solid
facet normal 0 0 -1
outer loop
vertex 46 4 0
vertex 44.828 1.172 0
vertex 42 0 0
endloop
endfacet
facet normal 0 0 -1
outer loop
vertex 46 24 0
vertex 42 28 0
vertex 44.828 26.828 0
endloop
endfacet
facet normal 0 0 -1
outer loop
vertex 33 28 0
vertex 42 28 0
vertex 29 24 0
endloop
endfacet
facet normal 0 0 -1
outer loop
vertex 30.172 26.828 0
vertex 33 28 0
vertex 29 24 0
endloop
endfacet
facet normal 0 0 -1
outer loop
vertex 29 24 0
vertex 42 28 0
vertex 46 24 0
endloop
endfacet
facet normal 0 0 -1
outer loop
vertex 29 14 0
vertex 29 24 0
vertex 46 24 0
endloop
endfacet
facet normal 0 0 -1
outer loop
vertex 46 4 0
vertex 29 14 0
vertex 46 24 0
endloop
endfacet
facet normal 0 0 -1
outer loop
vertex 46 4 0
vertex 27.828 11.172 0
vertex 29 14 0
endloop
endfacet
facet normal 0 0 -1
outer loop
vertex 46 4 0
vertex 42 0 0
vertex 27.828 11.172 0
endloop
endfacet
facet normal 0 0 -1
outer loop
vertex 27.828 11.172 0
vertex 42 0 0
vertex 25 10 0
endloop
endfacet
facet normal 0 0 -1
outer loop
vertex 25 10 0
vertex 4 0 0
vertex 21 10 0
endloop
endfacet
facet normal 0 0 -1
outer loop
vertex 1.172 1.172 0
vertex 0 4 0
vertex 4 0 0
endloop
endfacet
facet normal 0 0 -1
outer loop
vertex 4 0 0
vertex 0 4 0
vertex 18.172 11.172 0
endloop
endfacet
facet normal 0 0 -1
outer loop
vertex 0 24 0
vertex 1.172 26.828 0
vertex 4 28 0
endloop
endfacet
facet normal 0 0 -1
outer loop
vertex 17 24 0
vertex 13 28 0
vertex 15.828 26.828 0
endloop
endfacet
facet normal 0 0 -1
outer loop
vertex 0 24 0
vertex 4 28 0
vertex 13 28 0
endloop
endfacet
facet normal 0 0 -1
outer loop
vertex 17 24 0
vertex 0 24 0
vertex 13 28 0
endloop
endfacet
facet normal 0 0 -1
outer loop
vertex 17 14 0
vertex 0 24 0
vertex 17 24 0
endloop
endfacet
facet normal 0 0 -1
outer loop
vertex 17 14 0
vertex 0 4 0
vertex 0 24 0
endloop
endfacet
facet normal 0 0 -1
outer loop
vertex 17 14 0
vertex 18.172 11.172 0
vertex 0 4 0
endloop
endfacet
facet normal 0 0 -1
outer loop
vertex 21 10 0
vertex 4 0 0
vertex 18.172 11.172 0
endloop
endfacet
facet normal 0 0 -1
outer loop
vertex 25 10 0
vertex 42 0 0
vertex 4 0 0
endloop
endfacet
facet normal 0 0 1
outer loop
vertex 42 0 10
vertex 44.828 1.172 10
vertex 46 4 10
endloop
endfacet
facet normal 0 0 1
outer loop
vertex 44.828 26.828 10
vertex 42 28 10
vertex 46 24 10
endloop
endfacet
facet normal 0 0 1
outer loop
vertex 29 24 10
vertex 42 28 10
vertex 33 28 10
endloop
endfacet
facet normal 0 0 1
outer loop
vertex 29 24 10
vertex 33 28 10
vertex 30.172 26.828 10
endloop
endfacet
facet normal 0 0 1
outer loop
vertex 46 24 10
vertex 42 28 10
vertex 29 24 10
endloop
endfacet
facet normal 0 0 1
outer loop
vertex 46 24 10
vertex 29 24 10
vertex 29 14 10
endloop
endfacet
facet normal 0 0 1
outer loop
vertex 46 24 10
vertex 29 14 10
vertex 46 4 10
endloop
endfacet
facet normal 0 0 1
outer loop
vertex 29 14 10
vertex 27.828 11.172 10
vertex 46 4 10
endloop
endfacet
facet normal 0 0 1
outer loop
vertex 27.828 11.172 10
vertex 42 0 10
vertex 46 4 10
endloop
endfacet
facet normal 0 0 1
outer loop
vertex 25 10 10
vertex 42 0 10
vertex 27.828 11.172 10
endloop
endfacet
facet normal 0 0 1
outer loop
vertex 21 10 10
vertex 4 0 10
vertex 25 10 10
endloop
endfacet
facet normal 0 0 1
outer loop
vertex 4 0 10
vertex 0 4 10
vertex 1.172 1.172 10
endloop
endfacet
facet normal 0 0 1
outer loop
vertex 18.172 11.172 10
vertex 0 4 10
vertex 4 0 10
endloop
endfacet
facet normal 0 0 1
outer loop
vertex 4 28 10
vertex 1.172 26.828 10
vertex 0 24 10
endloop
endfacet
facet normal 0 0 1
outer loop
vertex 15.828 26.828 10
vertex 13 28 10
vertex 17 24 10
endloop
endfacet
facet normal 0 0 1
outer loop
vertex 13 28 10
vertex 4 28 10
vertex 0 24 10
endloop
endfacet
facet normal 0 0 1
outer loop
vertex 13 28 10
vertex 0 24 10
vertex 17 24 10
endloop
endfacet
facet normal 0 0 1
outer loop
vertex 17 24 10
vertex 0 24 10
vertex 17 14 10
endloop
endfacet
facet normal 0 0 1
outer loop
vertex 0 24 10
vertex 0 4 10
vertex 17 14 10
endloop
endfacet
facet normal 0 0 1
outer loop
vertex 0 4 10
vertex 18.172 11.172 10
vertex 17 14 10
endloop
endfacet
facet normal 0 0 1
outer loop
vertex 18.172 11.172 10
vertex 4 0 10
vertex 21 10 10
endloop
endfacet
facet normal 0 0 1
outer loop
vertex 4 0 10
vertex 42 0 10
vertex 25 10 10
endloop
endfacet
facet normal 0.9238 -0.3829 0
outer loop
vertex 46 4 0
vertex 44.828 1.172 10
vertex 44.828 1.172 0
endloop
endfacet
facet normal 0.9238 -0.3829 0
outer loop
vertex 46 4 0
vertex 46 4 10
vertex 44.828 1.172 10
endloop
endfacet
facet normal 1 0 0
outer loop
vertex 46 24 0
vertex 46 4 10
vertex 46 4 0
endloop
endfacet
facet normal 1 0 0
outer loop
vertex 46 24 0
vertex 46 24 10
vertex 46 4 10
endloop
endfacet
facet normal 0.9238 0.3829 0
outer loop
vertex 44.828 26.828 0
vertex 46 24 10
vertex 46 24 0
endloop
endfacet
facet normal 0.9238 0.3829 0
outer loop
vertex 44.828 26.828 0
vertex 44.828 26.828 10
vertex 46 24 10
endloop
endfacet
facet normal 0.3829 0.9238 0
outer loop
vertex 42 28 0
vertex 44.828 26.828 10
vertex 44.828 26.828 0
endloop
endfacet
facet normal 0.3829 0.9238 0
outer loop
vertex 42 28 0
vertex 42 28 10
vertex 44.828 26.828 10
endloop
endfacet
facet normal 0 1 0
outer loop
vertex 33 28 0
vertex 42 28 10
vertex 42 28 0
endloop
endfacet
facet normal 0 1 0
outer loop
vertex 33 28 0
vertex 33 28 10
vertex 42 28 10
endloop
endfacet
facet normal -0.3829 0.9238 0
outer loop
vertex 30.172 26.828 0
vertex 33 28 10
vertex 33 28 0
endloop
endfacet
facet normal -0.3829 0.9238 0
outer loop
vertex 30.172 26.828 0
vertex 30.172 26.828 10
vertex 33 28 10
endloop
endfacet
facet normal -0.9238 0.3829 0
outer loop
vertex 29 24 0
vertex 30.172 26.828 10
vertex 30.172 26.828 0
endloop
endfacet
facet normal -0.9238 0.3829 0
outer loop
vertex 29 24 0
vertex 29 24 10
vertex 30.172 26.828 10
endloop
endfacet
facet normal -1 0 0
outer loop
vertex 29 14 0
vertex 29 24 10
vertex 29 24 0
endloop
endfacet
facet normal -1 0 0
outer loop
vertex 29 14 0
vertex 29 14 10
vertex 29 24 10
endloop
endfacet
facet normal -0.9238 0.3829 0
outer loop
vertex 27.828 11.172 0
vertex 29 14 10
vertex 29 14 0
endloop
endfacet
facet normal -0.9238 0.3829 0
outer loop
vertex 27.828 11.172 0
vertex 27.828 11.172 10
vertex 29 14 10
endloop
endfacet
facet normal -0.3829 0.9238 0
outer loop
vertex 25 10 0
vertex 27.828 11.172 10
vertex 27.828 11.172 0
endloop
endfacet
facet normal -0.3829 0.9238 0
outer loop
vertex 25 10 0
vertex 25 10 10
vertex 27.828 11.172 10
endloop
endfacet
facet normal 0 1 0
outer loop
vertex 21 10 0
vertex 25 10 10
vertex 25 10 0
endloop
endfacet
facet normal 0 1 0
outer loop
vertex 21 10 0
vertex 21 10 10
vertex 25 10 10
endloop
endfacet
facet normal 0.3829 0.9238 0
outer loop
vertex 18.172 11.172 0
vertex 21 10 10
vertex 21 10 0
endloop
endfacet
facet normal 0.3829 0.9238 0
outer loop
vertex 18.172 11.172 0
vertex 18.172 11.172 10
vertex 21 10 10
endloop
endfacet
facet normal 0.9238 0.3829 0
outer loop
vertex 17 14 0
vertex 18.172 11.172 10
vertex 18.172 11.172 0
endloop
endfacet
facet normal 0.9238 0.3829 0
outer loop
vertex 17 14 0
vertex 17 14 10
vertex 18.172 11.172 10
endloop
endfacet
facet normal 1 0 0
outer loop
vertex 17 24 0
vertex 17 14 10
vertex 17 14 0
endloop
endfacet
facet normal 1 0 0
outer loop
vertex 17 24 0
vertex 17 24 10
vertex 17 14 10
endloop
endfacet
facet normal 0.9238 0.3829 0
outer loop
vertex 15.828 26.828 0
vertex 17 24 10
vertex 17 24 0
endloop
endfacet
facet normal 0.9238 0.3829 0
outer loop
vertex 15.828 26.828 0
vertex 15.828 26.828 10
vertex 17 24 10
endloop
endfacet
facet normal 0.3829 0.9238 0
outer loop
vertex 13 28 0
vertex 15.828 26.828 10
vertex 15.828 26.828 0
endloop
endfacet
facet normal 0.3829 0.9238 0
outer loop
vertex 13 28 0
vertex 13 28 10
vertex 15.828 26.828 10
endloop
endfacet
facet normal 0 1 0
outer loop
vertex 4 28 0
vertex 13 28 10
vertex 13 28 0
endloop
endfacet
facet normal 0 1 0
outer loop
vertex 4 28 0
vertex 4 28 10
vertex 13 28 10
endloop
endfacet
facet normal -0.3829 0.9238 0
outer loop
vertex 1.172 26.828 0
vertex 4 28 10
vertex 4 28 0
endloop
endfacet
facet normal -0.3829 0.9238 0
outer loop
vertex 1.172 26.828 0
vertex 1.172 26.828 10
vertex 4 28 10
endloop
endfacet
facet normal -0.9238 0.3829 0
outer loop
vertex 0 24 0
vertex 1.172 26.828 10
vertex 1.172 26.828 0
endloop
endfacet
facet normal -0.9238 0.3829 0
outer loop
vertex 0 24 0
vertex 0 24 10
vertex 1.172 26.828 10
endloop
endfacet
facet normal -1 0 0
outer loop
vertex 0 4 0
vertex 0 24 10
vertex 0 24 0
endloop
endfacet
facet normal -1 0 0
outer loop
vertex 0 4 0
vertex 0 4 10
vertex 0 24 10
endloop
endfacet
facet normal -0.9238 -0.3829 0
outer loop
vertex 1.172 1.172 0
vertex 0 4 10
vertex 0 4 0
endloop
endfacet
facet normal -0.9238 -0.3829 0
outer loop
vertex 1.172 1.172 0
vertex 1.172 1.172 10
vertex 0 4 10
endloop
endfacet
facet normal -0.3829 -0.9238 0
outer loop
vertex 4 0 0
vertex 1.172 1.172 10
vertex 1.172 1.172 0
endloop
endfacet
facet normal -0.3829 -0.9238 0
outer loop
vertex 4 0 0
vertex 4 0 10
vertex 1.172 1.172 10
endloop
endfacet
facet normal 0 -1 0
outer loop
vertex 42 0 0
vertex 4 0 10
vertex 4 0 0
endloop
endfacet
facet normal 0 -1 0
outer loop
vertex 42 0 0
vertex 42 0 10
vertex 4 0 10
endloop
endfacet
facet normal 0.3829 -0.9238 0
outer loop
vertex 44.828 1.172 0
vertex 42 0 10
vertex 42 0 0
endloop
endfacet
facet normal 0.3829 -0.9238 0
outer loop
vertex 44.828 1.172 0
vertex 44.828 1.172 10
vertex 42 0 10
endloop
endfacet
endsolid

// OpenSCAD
$fn = 32;

// ----------------------------------------------------------------------
// Eye lug: clevis, 10 mm thick
// ----------------------------------------------------------------------

// --- parameters (mm) ---
profile_height = 10;      // extrusion height
profile_points = 24;      // points of the closed outline

profile = [[0, 4], [1.172, 1.172], [4, 0], [42, 0], [44.828, 1.172], [46, 4], [46, 24], [44.828, 26.828], [42, 28], [33, 28], [30.172, 26.828], [29, 24], [29, 14], [27.828, 11.172], [25, 10], [21, 10], [18.172, 11.172], [17, 14], [17, 24], [15.828, 26.828], [13, 28], [4, 28], [1.172, 26.828], [0, 24]];  // single closed polygon, 24 points, counter clockwise

// --- the one profile operation ---
linear_extrude(height = profile_height) polygon(points = profile);
